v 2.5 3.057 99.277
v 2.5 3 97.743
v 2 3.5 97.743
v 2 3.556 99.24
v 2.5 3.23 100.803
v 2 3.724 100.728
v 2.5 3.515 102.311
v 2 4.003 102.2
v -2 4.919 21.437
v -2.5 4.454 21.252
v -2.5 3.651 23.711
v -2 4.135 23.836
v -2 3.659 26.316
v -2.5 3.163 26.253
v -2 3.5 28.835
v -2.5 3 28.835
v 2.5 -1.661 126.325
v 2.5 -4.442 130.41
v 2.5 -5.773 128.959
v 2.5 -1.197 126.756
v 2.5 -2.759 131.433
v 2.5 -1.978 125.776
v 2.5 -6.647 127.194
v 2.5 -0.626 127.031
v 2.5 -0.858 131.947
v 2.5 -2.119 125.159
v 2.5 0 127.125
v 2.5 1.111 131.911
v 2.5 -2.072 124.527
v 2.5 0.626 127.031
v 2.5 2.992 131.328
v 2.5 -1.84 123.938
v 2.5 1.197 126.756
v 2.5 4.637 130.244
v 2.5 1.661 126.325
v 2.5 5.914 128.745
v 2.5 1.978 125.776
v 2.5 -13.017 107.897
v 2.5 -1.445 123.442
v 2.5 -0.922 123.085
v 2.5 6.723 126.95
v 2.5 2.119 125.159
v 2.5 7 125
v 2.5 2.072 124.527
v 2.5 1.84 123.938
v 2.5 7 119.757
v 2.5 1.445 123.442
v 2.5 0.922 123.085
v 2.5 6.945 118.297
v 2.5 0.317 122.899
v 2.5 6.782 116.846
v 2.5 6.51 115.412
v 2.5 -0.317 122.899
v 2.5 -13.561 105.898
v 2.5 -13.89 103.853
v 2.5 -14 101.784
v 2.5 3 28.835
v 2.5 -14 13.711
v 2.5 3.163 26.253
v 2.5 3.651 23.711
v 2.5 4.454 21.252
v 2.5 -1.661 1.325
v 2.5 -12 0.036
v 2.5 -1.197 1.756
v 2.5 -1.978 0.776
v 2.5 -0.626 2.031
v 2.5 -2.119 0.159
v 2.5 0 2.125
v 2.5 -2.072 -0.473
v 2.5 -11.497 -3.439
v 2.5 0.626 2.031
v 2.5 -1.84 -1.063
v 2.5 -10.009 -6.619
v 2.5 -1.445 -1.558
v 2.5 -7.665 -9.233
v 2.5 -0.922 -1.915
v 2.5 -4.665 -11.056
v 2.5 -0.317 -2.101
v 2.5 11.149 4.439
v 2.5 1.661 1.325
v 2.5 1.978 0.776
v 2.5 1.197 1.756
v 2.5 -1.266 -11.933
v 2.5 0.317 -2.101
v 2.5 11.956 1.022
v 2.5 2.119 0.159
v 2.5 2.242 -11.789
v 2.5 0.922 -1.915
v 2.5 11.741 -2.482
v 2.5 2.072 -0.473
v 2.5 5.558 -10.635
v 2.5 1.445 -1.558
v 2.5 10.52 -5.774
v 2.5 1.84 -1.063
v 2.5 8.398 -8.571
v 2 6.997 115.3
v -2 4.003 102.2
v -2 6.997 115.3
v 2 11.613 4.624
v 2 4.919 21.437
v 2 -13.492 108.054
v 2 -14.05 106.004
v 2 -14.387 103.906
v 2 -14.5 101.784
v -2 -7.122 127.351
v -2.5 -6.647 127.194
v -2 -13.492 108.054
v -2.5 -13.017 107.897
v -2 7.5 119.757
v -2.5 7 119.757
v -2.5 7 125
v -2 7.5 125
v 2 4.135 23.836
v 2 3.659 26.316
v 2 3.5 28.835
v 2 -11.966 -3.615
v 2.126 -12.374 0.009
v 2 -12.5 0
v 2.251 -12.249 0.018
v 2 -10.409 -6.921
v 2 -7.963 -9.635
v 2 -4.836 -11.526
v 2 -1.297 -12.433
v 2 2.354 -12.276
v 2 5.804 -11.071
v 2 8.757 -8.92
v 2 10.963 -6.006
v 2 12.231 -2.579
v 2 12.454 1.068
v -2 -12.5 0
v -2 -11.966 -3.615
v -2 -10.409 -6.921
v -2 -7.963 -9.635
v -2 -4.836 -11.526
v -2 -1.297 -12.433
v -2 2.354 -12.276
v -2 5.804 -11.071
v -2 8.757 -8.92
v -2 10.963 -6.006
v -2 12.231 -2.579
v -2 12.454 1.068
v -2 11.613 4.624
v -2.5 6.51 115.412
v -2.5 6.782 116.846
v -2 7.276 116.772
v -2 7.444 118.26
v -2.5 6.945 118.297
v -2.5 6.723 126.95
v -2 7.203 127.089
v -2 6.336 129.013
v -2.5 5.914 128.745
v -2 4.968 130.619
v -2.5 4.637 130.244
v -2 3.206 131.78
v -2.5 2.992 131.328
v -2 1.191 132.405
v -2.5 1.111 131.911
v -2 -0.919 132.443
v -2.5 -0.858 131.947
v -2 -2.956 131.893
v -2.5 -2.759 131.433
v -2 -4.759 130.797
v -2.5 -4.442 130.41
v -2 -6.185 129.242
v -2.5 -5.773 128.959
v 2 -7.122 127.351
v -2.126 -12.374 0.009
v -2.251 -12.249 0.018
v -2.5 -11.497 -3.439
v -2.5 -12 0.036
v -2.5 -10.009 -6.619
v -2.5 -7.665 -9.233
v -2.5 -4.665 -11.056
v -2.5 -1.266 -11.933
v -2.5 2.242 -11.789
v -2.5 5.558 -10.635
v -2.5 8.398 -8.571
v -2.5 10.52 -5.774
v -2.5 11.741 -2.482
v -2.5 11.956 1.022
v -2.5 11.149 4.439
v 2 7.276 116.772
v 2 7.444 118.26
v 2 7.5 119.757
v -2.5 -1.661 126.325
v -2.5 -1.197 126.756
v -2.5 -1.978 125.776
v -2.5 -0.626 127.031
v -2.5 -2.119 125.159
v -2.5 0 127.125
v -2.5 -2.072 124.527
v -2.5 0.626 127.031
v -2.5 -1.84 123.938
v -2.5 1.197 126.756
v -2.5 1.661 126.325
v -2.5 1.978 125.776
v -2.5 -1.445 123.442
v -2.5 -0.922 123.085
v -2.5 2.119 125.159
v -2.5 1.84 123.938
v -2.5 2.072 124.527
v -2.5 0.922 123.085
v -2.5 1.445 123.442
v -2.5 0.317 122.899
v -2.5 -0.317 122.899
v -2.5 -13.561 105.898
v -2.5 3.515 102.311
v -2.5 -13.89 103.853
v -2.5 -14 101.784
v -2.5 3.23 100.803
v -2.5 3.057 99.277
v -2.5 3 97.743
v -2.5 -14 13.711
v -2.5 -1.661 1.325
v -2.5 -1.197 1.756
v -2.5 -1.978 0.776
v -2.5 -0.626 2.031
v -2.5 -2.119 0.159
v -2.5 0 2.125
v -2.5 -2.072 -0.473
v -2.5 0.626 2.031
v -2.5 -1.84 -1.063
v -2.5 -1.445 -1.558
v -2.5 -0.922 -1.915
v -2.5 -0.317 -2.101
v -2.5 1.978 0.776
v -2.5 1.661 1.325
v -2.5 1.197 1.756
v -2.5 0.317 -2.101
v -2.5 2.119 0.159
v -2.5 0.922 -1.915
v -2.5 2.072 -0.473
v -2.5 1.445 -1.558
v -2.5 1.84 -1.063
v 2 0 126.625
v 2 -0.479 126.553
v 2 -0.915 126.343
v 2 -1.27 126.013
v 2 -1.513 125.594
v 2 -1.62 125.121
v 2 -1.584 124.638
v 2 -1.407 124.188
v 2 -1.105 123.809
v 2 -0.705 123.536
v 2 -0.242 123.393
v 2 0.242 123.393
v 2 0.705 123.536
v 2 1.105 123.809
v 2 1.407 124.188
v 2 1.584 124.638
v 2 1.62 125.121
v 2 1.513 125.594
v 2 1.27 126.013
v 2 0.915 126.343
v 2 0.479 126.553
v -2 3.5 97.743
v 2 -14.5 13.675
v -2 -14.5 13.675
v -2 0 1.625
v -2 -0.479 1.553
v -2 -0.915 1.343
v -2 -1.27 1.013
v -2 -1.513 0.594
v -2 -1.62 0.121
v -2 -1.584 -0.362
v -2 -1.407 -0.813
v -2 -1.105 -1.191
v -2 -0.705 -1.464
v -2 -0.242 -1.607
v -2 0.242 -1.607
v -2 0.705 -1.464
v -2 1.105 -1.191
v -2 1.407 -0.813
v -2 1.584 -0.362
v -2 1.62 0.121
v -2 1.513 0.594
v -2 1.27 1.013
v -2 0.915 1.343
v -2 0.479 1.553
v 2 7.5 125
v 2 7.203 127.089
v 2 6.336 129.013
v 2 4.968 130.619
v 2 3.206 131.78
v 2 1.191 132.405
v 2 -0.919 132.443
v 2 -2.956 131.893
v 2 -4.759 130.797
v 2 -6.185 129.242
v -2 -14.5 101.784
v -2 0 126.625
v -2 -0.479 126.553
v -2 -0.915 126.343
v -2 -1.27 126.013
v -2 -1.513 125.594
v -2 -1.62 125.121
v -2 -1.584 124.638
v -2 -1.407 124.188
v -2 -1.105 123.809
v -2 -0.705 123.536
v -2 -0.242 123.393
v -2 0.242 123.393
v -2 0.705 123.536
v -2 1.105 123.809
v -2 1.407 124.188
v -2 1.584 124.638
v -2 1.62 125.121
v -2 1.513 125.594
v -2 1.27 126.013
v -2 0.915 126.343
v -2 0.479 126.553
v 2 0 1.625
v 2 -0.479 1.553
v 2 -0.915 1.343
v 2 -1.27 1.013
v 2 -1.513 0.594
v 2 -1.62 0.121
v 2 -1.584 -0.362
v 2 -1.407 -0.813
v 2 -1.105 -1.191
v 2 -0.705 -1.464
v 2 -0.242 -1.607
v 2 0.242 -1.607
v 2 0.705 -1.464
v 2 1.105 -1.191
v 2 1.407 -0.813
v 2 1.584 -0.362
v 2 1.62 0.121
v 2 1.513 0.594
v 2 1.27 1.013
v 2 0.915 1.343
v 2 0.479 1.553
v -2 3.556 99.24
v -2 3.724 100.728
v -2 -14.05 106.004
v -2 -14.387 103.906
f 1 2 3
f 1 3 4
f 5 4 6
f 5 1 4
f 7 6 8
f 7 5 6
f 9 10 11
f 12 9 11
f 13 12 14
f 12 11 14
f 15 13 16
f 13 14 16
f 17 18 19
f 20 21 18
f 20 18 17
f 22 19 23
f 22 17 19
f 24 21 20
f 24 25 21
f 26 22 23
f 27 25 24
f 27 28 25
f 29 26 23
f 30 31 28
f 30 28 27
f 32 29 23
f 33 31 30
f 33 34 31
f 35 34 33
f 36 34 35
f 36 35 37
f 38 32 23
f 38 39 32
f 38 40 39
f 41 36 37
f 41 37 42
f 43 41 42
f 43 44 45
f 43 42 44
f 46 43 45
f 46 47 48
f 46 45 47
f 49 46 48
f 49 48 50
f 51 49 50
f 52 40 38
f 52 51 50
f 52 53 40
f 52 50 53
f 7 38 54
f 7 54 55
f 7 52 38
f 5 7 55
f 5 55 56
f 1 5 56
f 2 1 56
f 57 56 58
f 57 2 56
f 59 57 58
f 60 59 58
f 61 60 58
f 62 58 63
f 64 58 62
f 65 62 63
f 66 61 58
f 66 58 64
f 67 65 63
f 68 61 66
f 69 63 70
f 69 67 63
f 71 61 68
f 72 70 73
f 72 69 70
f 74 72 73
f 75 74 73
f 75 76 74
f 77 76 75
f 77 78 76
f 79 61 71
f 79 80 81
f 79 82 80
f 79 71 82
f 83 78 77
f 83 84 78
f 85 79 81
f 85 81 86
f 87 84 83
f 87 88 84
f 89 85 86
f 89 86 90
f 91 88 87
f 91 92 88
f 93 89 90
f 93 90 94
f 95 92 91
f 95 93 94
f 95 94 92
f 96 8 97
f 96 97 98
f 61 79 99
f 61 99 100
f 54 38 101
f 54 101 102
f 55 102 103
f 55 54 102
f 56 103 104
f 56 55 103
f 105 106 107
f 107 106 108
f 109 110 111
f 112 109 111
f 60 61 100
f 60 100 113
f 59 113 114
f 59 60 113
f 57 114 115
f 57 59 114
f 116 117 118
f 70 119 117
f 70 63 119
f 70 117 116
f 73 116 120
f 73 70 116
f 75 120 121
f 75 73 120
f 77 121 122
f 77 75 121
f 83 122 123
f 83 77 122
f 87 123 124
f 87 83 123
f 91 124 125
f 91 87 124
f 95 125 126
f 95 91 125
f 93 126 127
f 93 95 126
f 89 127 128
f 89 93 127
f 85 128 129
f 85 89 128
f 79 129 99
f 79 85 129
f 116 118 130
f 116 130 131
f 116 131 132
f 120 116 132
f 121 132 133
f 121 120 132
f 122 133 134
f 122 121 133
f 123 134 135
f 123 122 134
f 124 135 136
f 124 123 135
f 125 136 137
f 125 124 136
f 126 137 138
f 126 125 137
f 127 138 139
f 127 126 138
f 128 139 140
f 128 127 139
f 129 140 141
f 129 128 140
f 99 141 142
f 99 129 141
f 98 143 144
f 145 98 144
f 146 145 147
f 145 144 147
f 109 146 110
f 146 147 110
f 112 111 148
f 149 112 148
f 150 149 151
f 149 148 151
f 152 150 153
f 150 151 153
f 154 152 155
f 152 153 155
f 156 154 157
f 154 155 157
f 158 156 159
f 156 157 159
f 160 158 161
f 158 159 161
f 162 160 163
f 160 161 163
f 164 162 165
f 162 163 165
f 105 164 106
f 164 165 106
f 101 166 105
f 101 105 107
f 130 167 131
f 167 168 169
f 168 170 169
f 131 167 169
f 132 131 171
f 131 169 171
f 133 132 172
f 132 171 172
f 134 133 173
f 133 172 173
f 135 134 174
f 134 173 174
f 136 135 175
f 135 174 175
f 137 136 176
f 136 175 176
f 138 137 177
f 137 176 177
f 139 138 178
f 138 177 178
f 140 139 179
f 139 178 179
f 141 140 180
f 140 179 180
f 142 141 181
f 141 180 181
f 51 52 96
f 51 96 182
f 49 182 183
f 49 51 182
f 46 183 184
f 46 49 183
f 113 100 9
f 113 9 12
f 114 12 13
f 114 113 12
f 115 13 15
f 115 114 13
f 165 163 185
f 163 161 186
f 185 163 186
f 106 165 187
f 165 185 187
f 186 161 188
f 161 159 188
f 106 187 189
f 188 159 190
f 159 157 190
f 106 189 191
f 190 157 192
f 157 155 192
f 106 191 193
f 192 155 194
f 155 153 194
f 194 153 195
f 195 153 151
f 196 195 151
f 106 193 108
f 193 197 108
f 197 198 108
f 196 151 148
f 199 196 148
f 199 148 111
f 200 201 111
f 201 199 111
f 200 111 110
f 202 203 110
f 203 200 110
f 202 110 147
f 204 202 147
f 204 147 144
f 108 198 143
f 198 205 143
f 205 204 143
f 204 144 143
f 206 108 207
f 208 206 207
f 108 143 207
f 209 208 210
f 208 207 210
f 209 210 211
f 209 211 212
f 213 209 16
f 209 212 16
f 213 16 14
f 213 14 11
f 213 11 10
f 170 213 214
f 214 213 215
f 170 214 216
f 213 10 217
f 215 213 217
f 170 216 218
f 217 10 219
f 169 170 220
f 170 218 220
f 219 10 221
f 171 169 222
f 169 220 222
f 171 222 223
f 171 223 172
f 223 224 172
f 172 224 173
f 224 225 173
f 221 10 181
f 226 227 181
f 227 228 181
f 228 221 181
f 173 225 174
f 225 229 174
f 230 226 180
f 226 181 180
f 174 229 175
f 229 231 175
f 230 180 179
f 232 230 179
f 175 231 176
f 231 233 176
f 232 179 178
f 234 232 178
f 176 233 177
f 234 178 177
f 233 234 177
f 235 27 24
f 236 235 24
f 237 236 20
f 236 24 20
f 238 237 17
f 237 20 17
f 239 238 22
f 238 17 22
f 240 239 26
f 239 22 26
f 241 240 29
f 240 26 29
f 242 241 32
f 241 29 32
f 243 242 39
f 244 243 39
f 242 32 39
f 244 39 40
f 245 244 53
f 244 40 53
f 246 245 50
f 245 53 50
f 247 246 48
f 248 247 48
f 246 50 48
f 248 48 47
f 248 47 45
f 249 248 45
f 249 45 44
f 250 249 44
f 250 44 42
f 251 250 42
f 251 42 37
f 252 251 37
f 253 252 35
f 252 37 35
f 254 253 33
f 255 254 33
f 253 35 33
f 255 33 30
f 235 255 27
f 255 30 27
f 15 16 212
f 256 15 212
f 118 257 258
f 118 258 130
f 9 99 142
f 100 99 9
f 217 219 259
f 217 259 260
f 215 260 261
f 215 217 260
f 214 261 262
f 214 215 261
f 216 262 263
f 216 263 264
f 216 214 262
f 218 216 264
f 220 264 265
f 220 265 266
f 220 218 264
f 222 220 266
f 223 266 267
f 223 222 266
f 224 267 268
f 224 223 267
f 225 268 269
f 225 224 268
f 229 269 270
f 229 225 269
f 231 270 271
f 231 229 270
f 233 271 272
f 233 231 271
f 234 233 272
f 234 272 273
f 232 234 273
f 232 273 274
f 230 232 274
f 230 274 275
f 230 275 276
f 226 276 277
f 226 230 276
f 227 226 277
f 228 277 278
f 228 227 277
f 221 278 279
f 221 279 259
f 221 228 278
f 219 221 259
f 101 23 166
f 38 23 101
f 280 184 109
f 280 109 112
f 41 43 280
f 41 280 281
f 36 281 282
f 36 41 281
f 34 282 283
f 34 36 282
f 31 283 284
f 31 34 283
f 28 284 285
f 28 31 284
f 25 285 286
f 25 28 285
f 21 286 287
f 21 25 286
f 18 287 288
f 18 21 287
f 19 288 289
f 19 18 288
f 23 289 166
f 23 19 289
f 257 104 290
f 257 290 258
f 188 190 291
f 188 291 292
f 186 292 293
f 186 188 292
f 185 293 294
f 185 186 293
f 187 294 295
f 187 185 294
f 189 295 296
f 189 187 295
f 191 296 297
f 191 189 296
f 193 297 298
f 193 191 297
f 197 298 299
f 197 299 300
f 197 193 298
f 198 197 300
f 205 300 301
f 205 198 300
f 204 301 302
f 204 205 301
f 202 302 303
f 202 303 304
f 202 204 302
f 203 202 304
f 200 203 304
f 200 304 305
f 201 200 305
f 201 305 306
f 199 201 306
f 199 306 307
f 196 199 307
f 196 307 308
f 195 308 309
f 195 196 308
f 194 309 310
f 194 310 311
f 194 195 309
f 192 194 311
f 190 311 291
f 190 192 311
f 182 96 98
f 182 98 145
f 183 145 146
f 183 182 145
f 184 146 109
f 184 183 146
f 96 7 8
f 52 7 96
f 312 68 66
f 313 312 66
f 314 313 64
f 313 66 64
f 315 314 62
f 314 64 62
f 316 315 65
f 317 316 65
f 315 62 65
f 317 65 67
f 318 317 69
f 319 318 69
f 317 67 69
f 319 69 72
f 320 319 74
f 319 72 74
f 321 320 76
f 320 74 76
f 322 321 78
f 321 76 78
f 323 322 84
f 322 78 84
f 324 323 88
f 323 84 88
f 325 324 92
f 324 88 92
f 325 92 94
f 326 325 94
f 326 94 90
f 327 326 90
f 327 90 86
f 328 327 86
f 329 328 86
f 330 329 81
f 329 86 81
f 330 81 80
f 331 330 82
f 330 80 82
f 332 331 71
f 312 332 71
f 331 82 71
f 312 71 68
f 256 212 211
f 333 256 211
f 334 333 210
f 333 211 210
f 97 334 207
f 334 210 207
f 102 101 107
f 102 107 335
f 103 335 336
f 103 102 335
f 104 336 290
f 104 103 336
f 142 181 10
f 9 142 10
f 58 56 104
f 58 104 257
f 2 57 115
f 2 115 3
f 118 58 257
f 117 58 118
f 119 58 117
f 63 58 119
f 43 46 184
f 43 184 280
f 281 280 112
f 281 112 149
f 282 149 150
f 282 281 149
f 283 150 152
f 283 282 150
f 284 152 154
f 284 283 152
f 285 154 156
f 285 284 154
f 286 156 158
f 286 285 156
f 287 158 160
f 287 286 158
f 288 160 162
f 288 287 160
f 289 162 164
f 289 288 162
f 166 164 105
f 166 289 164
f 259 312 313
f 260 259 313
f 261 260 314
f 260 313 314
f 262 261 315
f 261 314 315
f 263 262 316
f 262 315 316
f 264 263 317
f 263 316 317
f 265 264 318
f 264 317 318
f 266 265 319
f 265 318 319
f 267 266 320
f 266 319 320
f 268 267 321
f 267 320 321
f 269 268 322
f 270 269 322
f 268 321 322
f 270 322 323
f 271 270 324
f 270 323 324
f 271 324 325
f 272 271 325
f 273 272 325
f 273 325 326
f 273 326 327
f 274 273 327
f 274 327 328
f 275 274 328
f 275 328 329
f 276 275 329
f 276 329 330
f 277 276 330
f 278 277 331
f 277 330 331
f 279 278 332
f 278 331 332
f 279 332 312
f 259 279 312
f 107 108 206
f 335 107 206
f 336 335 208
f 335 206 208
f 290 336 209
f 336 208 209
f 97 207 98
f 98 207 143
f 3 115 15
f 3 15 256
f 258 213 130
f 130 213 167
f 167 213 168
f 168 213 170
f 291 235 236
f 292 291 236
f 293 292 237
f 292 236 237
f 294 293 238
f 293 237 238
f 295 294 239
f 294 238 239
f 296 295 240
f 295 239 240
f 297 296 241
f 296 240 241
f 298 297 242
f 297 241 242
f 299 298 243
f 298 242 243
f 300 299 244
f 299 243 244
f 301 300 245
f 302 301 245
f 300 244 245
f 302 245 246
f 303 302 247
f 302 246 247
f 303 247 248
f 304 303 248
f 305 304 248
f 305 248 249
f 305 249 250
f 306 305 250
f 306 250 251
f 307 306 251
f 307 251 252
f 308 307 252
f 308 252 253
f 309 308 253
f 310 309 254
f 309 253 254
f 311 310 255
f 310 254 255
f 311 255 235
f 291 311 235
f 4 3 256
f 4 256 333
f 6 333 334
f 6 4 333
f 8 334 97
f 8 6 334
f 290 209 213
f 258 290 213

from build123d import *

# Parameters (mm, degrees)
SKETCH_1_R      = 1.625
SKETCH_1_R_2    = 1.5
EXTRUDE_1_DEPTH = 5
CHAMFER_1_SIZE  = 0.5
EXTRUDE_2_DEPTH = 5


with BuildPart() as part:
    # 草图1 → 凸台-拉伸1 (new body)
    with BuildSketch(Plane(origin=(2.5, 0, 0), x_dir=(0, 0, -1), z_dir=(1, 0, 0))):
        with BuildLine():
            Line((-28.835359751, 3.5), (-97.743384645, 3.5))
            ThreePointArc((-97.743384645, 3.5), (-99.985771473, 3.626105029), (-102.199880675, 4.002829869))
            Line((-102.199880675, 4.002829869), (-115.300119325, 6.997170131))
            ThreePointArc((-115.300119325, 6.997170131), (-117.514228527, 7.373894971), (-119.756615355, 7.5))
            Line((-119.756615355, 7.5), (-125, 7.5))
            ThreePointArc((-125, 7.5), (-132.404899181, 1.190574699), (-127.350956164, -7.122008503))
            Line((-127.350956164, -7.122008503), (-108.053575901, -13.492022674))
            ThreePointArc((-108.053575901, -13.492022674), (-104.959225327, -14.246397817), (-101.784359462, -14.5))
            Line((-101.784359462, -14.5), (-13.675, -14.5))
            Line((-13.675, -14.5), (0, -12.5))
            ThreePointArc((0, -12.5), (12.276307634, 2.354202809), (-4.624146867, 11.613236661))
            Line((-4.624146867, 11.613236661), (-21.436724763, 4.918821342))
            ThreePointArc((-21.436724763, 4.918821342), (-25.068635256, 3.857907785), (-28.835359751, 3.5))
        make_face()
        with Locations(Location((-125, 0, 0), (0, 0, 180))):
            Circle(SKETCH_1_R, mode=Mode.SUBTRACT)
        with Locations(Location((-97.5, -5.5, 0), (0, 0, 180))):
            Circle(SKETCH_1_R_2, mode=Mode.SUBTRACT)
        with Locations(Location((-20, -5.5, 0), (0, 0, 180))):
            Circle(SKETCH_1_R_2, mode=Mode.SUBTRACT)
        with Locations(Location((0, 0, 0), (0, 0, 180))):
            Circle(SKETCH_1_R, mode=Mode.SUBTRACT)
        with BuildLine():
            Line((-87.5, -4), (-32.5, -4))
            ThreePointArc((-32.5, -4), (-31, -5.5), (-32.5, -7))
            Line((-32.5, -7), (-87.5, -7))
            ThreePointArc((-87.5, -7), (-89, -5.5), (-87.5, -4))
        make_face(mode=Mode.SUBTRACT)
    extrude(amount=-EXTRUDE_1_DEPTH)

    # 倒角1
    chamfer_1_edges = [part.edges().sort_by_distance(p)[0] for p in [
        (-2.5, 3.626105029, 99.985771473),
        (2.5, 8.266029002, 13.030435815),
        (2.5, 2.354202809, -12.276307634),
        (2.5, -13.5, 6.8375),
        (2.5, -14.5, 57.729679731),
        (2.5, -14.246397817, 104.959225327),
        (2.5, -10.307015588, 117.702266032),
        (2.5, 1.190574699, 132.404899181),
        (2.5, 7.5, 122.378307678),
        (2.5, 7.373894971, 117.514228527),
        (2.5, 5.5, 108.75),
        (-2.5, 5.5, 108.75),
        (2.5, 3.626105029, 99.985771473),
        (2.5, 3.5, 63.289372198),
        (2.5, 3.857907785, 25.068635256),
        (-2.5, 7.373894971, 117.514228527),
        (-2.5, 7.5, 122.378307678),
        (-2.5, 1.190574699, 132.404899181),
        (-2.5, -10.307015588, 117.702266032),
        (-2.5, 0, 123.375),
        (2.5, 0, 123.375),
        (-2.5, -14.246397817, 104.959225327),
        (-2.5, -5.5, 96),
        (2.5, -5.5, 96),
        (-2.5, -5.5, 18.5),
        (-2.5, -14.5, 57.729679731),
        (2.5, -5.5, 18.5),
        (-2.5, -13.5, 6.8375),
        (-2.5, -5.5, 89),
        (-2.5, -4, 60),
        (-2.5, -5.5, 31),
        (-2.5, -7, 60),
        (-2.5, 2.354202809, -12.276307634),
        (2.5, -5.5, 89),
        (2.5, -7, 60),
        (2.5, -5.5, 31),
        (2.5, -4, 60),
        (-2.5, 3.857907785, 25.068635256),
        (-2.5, 8.266029002, 13.030435815),
        (-2.5, 0, -1.625),
        (2.5, 0, -1.625),
        (-2.5, 3.5, 63.289372198),
    ]]
    chamfer(chamfer_1_edges, length=CHAMFER_1_SIZE)

    # Sketch 3D_1 → 凸台-拉伸2 (add)
    with BuildSketch(Plane(origin=(2.5, 0.724565904, 106.04601189), x_dir=(0, -0.10344866174004491, -0.9946347944769446), z_dir=(-1, 0, 0))):
        Polygon((0, 0), (92.493650367, -9.619957398), (96.694027737, 0), (73.434795042, 4.428728496), (1.034783284, 9.949200326), align=None)
    extrude(amount=EXTRUDE_2_DEPTH)


solid = part.part
